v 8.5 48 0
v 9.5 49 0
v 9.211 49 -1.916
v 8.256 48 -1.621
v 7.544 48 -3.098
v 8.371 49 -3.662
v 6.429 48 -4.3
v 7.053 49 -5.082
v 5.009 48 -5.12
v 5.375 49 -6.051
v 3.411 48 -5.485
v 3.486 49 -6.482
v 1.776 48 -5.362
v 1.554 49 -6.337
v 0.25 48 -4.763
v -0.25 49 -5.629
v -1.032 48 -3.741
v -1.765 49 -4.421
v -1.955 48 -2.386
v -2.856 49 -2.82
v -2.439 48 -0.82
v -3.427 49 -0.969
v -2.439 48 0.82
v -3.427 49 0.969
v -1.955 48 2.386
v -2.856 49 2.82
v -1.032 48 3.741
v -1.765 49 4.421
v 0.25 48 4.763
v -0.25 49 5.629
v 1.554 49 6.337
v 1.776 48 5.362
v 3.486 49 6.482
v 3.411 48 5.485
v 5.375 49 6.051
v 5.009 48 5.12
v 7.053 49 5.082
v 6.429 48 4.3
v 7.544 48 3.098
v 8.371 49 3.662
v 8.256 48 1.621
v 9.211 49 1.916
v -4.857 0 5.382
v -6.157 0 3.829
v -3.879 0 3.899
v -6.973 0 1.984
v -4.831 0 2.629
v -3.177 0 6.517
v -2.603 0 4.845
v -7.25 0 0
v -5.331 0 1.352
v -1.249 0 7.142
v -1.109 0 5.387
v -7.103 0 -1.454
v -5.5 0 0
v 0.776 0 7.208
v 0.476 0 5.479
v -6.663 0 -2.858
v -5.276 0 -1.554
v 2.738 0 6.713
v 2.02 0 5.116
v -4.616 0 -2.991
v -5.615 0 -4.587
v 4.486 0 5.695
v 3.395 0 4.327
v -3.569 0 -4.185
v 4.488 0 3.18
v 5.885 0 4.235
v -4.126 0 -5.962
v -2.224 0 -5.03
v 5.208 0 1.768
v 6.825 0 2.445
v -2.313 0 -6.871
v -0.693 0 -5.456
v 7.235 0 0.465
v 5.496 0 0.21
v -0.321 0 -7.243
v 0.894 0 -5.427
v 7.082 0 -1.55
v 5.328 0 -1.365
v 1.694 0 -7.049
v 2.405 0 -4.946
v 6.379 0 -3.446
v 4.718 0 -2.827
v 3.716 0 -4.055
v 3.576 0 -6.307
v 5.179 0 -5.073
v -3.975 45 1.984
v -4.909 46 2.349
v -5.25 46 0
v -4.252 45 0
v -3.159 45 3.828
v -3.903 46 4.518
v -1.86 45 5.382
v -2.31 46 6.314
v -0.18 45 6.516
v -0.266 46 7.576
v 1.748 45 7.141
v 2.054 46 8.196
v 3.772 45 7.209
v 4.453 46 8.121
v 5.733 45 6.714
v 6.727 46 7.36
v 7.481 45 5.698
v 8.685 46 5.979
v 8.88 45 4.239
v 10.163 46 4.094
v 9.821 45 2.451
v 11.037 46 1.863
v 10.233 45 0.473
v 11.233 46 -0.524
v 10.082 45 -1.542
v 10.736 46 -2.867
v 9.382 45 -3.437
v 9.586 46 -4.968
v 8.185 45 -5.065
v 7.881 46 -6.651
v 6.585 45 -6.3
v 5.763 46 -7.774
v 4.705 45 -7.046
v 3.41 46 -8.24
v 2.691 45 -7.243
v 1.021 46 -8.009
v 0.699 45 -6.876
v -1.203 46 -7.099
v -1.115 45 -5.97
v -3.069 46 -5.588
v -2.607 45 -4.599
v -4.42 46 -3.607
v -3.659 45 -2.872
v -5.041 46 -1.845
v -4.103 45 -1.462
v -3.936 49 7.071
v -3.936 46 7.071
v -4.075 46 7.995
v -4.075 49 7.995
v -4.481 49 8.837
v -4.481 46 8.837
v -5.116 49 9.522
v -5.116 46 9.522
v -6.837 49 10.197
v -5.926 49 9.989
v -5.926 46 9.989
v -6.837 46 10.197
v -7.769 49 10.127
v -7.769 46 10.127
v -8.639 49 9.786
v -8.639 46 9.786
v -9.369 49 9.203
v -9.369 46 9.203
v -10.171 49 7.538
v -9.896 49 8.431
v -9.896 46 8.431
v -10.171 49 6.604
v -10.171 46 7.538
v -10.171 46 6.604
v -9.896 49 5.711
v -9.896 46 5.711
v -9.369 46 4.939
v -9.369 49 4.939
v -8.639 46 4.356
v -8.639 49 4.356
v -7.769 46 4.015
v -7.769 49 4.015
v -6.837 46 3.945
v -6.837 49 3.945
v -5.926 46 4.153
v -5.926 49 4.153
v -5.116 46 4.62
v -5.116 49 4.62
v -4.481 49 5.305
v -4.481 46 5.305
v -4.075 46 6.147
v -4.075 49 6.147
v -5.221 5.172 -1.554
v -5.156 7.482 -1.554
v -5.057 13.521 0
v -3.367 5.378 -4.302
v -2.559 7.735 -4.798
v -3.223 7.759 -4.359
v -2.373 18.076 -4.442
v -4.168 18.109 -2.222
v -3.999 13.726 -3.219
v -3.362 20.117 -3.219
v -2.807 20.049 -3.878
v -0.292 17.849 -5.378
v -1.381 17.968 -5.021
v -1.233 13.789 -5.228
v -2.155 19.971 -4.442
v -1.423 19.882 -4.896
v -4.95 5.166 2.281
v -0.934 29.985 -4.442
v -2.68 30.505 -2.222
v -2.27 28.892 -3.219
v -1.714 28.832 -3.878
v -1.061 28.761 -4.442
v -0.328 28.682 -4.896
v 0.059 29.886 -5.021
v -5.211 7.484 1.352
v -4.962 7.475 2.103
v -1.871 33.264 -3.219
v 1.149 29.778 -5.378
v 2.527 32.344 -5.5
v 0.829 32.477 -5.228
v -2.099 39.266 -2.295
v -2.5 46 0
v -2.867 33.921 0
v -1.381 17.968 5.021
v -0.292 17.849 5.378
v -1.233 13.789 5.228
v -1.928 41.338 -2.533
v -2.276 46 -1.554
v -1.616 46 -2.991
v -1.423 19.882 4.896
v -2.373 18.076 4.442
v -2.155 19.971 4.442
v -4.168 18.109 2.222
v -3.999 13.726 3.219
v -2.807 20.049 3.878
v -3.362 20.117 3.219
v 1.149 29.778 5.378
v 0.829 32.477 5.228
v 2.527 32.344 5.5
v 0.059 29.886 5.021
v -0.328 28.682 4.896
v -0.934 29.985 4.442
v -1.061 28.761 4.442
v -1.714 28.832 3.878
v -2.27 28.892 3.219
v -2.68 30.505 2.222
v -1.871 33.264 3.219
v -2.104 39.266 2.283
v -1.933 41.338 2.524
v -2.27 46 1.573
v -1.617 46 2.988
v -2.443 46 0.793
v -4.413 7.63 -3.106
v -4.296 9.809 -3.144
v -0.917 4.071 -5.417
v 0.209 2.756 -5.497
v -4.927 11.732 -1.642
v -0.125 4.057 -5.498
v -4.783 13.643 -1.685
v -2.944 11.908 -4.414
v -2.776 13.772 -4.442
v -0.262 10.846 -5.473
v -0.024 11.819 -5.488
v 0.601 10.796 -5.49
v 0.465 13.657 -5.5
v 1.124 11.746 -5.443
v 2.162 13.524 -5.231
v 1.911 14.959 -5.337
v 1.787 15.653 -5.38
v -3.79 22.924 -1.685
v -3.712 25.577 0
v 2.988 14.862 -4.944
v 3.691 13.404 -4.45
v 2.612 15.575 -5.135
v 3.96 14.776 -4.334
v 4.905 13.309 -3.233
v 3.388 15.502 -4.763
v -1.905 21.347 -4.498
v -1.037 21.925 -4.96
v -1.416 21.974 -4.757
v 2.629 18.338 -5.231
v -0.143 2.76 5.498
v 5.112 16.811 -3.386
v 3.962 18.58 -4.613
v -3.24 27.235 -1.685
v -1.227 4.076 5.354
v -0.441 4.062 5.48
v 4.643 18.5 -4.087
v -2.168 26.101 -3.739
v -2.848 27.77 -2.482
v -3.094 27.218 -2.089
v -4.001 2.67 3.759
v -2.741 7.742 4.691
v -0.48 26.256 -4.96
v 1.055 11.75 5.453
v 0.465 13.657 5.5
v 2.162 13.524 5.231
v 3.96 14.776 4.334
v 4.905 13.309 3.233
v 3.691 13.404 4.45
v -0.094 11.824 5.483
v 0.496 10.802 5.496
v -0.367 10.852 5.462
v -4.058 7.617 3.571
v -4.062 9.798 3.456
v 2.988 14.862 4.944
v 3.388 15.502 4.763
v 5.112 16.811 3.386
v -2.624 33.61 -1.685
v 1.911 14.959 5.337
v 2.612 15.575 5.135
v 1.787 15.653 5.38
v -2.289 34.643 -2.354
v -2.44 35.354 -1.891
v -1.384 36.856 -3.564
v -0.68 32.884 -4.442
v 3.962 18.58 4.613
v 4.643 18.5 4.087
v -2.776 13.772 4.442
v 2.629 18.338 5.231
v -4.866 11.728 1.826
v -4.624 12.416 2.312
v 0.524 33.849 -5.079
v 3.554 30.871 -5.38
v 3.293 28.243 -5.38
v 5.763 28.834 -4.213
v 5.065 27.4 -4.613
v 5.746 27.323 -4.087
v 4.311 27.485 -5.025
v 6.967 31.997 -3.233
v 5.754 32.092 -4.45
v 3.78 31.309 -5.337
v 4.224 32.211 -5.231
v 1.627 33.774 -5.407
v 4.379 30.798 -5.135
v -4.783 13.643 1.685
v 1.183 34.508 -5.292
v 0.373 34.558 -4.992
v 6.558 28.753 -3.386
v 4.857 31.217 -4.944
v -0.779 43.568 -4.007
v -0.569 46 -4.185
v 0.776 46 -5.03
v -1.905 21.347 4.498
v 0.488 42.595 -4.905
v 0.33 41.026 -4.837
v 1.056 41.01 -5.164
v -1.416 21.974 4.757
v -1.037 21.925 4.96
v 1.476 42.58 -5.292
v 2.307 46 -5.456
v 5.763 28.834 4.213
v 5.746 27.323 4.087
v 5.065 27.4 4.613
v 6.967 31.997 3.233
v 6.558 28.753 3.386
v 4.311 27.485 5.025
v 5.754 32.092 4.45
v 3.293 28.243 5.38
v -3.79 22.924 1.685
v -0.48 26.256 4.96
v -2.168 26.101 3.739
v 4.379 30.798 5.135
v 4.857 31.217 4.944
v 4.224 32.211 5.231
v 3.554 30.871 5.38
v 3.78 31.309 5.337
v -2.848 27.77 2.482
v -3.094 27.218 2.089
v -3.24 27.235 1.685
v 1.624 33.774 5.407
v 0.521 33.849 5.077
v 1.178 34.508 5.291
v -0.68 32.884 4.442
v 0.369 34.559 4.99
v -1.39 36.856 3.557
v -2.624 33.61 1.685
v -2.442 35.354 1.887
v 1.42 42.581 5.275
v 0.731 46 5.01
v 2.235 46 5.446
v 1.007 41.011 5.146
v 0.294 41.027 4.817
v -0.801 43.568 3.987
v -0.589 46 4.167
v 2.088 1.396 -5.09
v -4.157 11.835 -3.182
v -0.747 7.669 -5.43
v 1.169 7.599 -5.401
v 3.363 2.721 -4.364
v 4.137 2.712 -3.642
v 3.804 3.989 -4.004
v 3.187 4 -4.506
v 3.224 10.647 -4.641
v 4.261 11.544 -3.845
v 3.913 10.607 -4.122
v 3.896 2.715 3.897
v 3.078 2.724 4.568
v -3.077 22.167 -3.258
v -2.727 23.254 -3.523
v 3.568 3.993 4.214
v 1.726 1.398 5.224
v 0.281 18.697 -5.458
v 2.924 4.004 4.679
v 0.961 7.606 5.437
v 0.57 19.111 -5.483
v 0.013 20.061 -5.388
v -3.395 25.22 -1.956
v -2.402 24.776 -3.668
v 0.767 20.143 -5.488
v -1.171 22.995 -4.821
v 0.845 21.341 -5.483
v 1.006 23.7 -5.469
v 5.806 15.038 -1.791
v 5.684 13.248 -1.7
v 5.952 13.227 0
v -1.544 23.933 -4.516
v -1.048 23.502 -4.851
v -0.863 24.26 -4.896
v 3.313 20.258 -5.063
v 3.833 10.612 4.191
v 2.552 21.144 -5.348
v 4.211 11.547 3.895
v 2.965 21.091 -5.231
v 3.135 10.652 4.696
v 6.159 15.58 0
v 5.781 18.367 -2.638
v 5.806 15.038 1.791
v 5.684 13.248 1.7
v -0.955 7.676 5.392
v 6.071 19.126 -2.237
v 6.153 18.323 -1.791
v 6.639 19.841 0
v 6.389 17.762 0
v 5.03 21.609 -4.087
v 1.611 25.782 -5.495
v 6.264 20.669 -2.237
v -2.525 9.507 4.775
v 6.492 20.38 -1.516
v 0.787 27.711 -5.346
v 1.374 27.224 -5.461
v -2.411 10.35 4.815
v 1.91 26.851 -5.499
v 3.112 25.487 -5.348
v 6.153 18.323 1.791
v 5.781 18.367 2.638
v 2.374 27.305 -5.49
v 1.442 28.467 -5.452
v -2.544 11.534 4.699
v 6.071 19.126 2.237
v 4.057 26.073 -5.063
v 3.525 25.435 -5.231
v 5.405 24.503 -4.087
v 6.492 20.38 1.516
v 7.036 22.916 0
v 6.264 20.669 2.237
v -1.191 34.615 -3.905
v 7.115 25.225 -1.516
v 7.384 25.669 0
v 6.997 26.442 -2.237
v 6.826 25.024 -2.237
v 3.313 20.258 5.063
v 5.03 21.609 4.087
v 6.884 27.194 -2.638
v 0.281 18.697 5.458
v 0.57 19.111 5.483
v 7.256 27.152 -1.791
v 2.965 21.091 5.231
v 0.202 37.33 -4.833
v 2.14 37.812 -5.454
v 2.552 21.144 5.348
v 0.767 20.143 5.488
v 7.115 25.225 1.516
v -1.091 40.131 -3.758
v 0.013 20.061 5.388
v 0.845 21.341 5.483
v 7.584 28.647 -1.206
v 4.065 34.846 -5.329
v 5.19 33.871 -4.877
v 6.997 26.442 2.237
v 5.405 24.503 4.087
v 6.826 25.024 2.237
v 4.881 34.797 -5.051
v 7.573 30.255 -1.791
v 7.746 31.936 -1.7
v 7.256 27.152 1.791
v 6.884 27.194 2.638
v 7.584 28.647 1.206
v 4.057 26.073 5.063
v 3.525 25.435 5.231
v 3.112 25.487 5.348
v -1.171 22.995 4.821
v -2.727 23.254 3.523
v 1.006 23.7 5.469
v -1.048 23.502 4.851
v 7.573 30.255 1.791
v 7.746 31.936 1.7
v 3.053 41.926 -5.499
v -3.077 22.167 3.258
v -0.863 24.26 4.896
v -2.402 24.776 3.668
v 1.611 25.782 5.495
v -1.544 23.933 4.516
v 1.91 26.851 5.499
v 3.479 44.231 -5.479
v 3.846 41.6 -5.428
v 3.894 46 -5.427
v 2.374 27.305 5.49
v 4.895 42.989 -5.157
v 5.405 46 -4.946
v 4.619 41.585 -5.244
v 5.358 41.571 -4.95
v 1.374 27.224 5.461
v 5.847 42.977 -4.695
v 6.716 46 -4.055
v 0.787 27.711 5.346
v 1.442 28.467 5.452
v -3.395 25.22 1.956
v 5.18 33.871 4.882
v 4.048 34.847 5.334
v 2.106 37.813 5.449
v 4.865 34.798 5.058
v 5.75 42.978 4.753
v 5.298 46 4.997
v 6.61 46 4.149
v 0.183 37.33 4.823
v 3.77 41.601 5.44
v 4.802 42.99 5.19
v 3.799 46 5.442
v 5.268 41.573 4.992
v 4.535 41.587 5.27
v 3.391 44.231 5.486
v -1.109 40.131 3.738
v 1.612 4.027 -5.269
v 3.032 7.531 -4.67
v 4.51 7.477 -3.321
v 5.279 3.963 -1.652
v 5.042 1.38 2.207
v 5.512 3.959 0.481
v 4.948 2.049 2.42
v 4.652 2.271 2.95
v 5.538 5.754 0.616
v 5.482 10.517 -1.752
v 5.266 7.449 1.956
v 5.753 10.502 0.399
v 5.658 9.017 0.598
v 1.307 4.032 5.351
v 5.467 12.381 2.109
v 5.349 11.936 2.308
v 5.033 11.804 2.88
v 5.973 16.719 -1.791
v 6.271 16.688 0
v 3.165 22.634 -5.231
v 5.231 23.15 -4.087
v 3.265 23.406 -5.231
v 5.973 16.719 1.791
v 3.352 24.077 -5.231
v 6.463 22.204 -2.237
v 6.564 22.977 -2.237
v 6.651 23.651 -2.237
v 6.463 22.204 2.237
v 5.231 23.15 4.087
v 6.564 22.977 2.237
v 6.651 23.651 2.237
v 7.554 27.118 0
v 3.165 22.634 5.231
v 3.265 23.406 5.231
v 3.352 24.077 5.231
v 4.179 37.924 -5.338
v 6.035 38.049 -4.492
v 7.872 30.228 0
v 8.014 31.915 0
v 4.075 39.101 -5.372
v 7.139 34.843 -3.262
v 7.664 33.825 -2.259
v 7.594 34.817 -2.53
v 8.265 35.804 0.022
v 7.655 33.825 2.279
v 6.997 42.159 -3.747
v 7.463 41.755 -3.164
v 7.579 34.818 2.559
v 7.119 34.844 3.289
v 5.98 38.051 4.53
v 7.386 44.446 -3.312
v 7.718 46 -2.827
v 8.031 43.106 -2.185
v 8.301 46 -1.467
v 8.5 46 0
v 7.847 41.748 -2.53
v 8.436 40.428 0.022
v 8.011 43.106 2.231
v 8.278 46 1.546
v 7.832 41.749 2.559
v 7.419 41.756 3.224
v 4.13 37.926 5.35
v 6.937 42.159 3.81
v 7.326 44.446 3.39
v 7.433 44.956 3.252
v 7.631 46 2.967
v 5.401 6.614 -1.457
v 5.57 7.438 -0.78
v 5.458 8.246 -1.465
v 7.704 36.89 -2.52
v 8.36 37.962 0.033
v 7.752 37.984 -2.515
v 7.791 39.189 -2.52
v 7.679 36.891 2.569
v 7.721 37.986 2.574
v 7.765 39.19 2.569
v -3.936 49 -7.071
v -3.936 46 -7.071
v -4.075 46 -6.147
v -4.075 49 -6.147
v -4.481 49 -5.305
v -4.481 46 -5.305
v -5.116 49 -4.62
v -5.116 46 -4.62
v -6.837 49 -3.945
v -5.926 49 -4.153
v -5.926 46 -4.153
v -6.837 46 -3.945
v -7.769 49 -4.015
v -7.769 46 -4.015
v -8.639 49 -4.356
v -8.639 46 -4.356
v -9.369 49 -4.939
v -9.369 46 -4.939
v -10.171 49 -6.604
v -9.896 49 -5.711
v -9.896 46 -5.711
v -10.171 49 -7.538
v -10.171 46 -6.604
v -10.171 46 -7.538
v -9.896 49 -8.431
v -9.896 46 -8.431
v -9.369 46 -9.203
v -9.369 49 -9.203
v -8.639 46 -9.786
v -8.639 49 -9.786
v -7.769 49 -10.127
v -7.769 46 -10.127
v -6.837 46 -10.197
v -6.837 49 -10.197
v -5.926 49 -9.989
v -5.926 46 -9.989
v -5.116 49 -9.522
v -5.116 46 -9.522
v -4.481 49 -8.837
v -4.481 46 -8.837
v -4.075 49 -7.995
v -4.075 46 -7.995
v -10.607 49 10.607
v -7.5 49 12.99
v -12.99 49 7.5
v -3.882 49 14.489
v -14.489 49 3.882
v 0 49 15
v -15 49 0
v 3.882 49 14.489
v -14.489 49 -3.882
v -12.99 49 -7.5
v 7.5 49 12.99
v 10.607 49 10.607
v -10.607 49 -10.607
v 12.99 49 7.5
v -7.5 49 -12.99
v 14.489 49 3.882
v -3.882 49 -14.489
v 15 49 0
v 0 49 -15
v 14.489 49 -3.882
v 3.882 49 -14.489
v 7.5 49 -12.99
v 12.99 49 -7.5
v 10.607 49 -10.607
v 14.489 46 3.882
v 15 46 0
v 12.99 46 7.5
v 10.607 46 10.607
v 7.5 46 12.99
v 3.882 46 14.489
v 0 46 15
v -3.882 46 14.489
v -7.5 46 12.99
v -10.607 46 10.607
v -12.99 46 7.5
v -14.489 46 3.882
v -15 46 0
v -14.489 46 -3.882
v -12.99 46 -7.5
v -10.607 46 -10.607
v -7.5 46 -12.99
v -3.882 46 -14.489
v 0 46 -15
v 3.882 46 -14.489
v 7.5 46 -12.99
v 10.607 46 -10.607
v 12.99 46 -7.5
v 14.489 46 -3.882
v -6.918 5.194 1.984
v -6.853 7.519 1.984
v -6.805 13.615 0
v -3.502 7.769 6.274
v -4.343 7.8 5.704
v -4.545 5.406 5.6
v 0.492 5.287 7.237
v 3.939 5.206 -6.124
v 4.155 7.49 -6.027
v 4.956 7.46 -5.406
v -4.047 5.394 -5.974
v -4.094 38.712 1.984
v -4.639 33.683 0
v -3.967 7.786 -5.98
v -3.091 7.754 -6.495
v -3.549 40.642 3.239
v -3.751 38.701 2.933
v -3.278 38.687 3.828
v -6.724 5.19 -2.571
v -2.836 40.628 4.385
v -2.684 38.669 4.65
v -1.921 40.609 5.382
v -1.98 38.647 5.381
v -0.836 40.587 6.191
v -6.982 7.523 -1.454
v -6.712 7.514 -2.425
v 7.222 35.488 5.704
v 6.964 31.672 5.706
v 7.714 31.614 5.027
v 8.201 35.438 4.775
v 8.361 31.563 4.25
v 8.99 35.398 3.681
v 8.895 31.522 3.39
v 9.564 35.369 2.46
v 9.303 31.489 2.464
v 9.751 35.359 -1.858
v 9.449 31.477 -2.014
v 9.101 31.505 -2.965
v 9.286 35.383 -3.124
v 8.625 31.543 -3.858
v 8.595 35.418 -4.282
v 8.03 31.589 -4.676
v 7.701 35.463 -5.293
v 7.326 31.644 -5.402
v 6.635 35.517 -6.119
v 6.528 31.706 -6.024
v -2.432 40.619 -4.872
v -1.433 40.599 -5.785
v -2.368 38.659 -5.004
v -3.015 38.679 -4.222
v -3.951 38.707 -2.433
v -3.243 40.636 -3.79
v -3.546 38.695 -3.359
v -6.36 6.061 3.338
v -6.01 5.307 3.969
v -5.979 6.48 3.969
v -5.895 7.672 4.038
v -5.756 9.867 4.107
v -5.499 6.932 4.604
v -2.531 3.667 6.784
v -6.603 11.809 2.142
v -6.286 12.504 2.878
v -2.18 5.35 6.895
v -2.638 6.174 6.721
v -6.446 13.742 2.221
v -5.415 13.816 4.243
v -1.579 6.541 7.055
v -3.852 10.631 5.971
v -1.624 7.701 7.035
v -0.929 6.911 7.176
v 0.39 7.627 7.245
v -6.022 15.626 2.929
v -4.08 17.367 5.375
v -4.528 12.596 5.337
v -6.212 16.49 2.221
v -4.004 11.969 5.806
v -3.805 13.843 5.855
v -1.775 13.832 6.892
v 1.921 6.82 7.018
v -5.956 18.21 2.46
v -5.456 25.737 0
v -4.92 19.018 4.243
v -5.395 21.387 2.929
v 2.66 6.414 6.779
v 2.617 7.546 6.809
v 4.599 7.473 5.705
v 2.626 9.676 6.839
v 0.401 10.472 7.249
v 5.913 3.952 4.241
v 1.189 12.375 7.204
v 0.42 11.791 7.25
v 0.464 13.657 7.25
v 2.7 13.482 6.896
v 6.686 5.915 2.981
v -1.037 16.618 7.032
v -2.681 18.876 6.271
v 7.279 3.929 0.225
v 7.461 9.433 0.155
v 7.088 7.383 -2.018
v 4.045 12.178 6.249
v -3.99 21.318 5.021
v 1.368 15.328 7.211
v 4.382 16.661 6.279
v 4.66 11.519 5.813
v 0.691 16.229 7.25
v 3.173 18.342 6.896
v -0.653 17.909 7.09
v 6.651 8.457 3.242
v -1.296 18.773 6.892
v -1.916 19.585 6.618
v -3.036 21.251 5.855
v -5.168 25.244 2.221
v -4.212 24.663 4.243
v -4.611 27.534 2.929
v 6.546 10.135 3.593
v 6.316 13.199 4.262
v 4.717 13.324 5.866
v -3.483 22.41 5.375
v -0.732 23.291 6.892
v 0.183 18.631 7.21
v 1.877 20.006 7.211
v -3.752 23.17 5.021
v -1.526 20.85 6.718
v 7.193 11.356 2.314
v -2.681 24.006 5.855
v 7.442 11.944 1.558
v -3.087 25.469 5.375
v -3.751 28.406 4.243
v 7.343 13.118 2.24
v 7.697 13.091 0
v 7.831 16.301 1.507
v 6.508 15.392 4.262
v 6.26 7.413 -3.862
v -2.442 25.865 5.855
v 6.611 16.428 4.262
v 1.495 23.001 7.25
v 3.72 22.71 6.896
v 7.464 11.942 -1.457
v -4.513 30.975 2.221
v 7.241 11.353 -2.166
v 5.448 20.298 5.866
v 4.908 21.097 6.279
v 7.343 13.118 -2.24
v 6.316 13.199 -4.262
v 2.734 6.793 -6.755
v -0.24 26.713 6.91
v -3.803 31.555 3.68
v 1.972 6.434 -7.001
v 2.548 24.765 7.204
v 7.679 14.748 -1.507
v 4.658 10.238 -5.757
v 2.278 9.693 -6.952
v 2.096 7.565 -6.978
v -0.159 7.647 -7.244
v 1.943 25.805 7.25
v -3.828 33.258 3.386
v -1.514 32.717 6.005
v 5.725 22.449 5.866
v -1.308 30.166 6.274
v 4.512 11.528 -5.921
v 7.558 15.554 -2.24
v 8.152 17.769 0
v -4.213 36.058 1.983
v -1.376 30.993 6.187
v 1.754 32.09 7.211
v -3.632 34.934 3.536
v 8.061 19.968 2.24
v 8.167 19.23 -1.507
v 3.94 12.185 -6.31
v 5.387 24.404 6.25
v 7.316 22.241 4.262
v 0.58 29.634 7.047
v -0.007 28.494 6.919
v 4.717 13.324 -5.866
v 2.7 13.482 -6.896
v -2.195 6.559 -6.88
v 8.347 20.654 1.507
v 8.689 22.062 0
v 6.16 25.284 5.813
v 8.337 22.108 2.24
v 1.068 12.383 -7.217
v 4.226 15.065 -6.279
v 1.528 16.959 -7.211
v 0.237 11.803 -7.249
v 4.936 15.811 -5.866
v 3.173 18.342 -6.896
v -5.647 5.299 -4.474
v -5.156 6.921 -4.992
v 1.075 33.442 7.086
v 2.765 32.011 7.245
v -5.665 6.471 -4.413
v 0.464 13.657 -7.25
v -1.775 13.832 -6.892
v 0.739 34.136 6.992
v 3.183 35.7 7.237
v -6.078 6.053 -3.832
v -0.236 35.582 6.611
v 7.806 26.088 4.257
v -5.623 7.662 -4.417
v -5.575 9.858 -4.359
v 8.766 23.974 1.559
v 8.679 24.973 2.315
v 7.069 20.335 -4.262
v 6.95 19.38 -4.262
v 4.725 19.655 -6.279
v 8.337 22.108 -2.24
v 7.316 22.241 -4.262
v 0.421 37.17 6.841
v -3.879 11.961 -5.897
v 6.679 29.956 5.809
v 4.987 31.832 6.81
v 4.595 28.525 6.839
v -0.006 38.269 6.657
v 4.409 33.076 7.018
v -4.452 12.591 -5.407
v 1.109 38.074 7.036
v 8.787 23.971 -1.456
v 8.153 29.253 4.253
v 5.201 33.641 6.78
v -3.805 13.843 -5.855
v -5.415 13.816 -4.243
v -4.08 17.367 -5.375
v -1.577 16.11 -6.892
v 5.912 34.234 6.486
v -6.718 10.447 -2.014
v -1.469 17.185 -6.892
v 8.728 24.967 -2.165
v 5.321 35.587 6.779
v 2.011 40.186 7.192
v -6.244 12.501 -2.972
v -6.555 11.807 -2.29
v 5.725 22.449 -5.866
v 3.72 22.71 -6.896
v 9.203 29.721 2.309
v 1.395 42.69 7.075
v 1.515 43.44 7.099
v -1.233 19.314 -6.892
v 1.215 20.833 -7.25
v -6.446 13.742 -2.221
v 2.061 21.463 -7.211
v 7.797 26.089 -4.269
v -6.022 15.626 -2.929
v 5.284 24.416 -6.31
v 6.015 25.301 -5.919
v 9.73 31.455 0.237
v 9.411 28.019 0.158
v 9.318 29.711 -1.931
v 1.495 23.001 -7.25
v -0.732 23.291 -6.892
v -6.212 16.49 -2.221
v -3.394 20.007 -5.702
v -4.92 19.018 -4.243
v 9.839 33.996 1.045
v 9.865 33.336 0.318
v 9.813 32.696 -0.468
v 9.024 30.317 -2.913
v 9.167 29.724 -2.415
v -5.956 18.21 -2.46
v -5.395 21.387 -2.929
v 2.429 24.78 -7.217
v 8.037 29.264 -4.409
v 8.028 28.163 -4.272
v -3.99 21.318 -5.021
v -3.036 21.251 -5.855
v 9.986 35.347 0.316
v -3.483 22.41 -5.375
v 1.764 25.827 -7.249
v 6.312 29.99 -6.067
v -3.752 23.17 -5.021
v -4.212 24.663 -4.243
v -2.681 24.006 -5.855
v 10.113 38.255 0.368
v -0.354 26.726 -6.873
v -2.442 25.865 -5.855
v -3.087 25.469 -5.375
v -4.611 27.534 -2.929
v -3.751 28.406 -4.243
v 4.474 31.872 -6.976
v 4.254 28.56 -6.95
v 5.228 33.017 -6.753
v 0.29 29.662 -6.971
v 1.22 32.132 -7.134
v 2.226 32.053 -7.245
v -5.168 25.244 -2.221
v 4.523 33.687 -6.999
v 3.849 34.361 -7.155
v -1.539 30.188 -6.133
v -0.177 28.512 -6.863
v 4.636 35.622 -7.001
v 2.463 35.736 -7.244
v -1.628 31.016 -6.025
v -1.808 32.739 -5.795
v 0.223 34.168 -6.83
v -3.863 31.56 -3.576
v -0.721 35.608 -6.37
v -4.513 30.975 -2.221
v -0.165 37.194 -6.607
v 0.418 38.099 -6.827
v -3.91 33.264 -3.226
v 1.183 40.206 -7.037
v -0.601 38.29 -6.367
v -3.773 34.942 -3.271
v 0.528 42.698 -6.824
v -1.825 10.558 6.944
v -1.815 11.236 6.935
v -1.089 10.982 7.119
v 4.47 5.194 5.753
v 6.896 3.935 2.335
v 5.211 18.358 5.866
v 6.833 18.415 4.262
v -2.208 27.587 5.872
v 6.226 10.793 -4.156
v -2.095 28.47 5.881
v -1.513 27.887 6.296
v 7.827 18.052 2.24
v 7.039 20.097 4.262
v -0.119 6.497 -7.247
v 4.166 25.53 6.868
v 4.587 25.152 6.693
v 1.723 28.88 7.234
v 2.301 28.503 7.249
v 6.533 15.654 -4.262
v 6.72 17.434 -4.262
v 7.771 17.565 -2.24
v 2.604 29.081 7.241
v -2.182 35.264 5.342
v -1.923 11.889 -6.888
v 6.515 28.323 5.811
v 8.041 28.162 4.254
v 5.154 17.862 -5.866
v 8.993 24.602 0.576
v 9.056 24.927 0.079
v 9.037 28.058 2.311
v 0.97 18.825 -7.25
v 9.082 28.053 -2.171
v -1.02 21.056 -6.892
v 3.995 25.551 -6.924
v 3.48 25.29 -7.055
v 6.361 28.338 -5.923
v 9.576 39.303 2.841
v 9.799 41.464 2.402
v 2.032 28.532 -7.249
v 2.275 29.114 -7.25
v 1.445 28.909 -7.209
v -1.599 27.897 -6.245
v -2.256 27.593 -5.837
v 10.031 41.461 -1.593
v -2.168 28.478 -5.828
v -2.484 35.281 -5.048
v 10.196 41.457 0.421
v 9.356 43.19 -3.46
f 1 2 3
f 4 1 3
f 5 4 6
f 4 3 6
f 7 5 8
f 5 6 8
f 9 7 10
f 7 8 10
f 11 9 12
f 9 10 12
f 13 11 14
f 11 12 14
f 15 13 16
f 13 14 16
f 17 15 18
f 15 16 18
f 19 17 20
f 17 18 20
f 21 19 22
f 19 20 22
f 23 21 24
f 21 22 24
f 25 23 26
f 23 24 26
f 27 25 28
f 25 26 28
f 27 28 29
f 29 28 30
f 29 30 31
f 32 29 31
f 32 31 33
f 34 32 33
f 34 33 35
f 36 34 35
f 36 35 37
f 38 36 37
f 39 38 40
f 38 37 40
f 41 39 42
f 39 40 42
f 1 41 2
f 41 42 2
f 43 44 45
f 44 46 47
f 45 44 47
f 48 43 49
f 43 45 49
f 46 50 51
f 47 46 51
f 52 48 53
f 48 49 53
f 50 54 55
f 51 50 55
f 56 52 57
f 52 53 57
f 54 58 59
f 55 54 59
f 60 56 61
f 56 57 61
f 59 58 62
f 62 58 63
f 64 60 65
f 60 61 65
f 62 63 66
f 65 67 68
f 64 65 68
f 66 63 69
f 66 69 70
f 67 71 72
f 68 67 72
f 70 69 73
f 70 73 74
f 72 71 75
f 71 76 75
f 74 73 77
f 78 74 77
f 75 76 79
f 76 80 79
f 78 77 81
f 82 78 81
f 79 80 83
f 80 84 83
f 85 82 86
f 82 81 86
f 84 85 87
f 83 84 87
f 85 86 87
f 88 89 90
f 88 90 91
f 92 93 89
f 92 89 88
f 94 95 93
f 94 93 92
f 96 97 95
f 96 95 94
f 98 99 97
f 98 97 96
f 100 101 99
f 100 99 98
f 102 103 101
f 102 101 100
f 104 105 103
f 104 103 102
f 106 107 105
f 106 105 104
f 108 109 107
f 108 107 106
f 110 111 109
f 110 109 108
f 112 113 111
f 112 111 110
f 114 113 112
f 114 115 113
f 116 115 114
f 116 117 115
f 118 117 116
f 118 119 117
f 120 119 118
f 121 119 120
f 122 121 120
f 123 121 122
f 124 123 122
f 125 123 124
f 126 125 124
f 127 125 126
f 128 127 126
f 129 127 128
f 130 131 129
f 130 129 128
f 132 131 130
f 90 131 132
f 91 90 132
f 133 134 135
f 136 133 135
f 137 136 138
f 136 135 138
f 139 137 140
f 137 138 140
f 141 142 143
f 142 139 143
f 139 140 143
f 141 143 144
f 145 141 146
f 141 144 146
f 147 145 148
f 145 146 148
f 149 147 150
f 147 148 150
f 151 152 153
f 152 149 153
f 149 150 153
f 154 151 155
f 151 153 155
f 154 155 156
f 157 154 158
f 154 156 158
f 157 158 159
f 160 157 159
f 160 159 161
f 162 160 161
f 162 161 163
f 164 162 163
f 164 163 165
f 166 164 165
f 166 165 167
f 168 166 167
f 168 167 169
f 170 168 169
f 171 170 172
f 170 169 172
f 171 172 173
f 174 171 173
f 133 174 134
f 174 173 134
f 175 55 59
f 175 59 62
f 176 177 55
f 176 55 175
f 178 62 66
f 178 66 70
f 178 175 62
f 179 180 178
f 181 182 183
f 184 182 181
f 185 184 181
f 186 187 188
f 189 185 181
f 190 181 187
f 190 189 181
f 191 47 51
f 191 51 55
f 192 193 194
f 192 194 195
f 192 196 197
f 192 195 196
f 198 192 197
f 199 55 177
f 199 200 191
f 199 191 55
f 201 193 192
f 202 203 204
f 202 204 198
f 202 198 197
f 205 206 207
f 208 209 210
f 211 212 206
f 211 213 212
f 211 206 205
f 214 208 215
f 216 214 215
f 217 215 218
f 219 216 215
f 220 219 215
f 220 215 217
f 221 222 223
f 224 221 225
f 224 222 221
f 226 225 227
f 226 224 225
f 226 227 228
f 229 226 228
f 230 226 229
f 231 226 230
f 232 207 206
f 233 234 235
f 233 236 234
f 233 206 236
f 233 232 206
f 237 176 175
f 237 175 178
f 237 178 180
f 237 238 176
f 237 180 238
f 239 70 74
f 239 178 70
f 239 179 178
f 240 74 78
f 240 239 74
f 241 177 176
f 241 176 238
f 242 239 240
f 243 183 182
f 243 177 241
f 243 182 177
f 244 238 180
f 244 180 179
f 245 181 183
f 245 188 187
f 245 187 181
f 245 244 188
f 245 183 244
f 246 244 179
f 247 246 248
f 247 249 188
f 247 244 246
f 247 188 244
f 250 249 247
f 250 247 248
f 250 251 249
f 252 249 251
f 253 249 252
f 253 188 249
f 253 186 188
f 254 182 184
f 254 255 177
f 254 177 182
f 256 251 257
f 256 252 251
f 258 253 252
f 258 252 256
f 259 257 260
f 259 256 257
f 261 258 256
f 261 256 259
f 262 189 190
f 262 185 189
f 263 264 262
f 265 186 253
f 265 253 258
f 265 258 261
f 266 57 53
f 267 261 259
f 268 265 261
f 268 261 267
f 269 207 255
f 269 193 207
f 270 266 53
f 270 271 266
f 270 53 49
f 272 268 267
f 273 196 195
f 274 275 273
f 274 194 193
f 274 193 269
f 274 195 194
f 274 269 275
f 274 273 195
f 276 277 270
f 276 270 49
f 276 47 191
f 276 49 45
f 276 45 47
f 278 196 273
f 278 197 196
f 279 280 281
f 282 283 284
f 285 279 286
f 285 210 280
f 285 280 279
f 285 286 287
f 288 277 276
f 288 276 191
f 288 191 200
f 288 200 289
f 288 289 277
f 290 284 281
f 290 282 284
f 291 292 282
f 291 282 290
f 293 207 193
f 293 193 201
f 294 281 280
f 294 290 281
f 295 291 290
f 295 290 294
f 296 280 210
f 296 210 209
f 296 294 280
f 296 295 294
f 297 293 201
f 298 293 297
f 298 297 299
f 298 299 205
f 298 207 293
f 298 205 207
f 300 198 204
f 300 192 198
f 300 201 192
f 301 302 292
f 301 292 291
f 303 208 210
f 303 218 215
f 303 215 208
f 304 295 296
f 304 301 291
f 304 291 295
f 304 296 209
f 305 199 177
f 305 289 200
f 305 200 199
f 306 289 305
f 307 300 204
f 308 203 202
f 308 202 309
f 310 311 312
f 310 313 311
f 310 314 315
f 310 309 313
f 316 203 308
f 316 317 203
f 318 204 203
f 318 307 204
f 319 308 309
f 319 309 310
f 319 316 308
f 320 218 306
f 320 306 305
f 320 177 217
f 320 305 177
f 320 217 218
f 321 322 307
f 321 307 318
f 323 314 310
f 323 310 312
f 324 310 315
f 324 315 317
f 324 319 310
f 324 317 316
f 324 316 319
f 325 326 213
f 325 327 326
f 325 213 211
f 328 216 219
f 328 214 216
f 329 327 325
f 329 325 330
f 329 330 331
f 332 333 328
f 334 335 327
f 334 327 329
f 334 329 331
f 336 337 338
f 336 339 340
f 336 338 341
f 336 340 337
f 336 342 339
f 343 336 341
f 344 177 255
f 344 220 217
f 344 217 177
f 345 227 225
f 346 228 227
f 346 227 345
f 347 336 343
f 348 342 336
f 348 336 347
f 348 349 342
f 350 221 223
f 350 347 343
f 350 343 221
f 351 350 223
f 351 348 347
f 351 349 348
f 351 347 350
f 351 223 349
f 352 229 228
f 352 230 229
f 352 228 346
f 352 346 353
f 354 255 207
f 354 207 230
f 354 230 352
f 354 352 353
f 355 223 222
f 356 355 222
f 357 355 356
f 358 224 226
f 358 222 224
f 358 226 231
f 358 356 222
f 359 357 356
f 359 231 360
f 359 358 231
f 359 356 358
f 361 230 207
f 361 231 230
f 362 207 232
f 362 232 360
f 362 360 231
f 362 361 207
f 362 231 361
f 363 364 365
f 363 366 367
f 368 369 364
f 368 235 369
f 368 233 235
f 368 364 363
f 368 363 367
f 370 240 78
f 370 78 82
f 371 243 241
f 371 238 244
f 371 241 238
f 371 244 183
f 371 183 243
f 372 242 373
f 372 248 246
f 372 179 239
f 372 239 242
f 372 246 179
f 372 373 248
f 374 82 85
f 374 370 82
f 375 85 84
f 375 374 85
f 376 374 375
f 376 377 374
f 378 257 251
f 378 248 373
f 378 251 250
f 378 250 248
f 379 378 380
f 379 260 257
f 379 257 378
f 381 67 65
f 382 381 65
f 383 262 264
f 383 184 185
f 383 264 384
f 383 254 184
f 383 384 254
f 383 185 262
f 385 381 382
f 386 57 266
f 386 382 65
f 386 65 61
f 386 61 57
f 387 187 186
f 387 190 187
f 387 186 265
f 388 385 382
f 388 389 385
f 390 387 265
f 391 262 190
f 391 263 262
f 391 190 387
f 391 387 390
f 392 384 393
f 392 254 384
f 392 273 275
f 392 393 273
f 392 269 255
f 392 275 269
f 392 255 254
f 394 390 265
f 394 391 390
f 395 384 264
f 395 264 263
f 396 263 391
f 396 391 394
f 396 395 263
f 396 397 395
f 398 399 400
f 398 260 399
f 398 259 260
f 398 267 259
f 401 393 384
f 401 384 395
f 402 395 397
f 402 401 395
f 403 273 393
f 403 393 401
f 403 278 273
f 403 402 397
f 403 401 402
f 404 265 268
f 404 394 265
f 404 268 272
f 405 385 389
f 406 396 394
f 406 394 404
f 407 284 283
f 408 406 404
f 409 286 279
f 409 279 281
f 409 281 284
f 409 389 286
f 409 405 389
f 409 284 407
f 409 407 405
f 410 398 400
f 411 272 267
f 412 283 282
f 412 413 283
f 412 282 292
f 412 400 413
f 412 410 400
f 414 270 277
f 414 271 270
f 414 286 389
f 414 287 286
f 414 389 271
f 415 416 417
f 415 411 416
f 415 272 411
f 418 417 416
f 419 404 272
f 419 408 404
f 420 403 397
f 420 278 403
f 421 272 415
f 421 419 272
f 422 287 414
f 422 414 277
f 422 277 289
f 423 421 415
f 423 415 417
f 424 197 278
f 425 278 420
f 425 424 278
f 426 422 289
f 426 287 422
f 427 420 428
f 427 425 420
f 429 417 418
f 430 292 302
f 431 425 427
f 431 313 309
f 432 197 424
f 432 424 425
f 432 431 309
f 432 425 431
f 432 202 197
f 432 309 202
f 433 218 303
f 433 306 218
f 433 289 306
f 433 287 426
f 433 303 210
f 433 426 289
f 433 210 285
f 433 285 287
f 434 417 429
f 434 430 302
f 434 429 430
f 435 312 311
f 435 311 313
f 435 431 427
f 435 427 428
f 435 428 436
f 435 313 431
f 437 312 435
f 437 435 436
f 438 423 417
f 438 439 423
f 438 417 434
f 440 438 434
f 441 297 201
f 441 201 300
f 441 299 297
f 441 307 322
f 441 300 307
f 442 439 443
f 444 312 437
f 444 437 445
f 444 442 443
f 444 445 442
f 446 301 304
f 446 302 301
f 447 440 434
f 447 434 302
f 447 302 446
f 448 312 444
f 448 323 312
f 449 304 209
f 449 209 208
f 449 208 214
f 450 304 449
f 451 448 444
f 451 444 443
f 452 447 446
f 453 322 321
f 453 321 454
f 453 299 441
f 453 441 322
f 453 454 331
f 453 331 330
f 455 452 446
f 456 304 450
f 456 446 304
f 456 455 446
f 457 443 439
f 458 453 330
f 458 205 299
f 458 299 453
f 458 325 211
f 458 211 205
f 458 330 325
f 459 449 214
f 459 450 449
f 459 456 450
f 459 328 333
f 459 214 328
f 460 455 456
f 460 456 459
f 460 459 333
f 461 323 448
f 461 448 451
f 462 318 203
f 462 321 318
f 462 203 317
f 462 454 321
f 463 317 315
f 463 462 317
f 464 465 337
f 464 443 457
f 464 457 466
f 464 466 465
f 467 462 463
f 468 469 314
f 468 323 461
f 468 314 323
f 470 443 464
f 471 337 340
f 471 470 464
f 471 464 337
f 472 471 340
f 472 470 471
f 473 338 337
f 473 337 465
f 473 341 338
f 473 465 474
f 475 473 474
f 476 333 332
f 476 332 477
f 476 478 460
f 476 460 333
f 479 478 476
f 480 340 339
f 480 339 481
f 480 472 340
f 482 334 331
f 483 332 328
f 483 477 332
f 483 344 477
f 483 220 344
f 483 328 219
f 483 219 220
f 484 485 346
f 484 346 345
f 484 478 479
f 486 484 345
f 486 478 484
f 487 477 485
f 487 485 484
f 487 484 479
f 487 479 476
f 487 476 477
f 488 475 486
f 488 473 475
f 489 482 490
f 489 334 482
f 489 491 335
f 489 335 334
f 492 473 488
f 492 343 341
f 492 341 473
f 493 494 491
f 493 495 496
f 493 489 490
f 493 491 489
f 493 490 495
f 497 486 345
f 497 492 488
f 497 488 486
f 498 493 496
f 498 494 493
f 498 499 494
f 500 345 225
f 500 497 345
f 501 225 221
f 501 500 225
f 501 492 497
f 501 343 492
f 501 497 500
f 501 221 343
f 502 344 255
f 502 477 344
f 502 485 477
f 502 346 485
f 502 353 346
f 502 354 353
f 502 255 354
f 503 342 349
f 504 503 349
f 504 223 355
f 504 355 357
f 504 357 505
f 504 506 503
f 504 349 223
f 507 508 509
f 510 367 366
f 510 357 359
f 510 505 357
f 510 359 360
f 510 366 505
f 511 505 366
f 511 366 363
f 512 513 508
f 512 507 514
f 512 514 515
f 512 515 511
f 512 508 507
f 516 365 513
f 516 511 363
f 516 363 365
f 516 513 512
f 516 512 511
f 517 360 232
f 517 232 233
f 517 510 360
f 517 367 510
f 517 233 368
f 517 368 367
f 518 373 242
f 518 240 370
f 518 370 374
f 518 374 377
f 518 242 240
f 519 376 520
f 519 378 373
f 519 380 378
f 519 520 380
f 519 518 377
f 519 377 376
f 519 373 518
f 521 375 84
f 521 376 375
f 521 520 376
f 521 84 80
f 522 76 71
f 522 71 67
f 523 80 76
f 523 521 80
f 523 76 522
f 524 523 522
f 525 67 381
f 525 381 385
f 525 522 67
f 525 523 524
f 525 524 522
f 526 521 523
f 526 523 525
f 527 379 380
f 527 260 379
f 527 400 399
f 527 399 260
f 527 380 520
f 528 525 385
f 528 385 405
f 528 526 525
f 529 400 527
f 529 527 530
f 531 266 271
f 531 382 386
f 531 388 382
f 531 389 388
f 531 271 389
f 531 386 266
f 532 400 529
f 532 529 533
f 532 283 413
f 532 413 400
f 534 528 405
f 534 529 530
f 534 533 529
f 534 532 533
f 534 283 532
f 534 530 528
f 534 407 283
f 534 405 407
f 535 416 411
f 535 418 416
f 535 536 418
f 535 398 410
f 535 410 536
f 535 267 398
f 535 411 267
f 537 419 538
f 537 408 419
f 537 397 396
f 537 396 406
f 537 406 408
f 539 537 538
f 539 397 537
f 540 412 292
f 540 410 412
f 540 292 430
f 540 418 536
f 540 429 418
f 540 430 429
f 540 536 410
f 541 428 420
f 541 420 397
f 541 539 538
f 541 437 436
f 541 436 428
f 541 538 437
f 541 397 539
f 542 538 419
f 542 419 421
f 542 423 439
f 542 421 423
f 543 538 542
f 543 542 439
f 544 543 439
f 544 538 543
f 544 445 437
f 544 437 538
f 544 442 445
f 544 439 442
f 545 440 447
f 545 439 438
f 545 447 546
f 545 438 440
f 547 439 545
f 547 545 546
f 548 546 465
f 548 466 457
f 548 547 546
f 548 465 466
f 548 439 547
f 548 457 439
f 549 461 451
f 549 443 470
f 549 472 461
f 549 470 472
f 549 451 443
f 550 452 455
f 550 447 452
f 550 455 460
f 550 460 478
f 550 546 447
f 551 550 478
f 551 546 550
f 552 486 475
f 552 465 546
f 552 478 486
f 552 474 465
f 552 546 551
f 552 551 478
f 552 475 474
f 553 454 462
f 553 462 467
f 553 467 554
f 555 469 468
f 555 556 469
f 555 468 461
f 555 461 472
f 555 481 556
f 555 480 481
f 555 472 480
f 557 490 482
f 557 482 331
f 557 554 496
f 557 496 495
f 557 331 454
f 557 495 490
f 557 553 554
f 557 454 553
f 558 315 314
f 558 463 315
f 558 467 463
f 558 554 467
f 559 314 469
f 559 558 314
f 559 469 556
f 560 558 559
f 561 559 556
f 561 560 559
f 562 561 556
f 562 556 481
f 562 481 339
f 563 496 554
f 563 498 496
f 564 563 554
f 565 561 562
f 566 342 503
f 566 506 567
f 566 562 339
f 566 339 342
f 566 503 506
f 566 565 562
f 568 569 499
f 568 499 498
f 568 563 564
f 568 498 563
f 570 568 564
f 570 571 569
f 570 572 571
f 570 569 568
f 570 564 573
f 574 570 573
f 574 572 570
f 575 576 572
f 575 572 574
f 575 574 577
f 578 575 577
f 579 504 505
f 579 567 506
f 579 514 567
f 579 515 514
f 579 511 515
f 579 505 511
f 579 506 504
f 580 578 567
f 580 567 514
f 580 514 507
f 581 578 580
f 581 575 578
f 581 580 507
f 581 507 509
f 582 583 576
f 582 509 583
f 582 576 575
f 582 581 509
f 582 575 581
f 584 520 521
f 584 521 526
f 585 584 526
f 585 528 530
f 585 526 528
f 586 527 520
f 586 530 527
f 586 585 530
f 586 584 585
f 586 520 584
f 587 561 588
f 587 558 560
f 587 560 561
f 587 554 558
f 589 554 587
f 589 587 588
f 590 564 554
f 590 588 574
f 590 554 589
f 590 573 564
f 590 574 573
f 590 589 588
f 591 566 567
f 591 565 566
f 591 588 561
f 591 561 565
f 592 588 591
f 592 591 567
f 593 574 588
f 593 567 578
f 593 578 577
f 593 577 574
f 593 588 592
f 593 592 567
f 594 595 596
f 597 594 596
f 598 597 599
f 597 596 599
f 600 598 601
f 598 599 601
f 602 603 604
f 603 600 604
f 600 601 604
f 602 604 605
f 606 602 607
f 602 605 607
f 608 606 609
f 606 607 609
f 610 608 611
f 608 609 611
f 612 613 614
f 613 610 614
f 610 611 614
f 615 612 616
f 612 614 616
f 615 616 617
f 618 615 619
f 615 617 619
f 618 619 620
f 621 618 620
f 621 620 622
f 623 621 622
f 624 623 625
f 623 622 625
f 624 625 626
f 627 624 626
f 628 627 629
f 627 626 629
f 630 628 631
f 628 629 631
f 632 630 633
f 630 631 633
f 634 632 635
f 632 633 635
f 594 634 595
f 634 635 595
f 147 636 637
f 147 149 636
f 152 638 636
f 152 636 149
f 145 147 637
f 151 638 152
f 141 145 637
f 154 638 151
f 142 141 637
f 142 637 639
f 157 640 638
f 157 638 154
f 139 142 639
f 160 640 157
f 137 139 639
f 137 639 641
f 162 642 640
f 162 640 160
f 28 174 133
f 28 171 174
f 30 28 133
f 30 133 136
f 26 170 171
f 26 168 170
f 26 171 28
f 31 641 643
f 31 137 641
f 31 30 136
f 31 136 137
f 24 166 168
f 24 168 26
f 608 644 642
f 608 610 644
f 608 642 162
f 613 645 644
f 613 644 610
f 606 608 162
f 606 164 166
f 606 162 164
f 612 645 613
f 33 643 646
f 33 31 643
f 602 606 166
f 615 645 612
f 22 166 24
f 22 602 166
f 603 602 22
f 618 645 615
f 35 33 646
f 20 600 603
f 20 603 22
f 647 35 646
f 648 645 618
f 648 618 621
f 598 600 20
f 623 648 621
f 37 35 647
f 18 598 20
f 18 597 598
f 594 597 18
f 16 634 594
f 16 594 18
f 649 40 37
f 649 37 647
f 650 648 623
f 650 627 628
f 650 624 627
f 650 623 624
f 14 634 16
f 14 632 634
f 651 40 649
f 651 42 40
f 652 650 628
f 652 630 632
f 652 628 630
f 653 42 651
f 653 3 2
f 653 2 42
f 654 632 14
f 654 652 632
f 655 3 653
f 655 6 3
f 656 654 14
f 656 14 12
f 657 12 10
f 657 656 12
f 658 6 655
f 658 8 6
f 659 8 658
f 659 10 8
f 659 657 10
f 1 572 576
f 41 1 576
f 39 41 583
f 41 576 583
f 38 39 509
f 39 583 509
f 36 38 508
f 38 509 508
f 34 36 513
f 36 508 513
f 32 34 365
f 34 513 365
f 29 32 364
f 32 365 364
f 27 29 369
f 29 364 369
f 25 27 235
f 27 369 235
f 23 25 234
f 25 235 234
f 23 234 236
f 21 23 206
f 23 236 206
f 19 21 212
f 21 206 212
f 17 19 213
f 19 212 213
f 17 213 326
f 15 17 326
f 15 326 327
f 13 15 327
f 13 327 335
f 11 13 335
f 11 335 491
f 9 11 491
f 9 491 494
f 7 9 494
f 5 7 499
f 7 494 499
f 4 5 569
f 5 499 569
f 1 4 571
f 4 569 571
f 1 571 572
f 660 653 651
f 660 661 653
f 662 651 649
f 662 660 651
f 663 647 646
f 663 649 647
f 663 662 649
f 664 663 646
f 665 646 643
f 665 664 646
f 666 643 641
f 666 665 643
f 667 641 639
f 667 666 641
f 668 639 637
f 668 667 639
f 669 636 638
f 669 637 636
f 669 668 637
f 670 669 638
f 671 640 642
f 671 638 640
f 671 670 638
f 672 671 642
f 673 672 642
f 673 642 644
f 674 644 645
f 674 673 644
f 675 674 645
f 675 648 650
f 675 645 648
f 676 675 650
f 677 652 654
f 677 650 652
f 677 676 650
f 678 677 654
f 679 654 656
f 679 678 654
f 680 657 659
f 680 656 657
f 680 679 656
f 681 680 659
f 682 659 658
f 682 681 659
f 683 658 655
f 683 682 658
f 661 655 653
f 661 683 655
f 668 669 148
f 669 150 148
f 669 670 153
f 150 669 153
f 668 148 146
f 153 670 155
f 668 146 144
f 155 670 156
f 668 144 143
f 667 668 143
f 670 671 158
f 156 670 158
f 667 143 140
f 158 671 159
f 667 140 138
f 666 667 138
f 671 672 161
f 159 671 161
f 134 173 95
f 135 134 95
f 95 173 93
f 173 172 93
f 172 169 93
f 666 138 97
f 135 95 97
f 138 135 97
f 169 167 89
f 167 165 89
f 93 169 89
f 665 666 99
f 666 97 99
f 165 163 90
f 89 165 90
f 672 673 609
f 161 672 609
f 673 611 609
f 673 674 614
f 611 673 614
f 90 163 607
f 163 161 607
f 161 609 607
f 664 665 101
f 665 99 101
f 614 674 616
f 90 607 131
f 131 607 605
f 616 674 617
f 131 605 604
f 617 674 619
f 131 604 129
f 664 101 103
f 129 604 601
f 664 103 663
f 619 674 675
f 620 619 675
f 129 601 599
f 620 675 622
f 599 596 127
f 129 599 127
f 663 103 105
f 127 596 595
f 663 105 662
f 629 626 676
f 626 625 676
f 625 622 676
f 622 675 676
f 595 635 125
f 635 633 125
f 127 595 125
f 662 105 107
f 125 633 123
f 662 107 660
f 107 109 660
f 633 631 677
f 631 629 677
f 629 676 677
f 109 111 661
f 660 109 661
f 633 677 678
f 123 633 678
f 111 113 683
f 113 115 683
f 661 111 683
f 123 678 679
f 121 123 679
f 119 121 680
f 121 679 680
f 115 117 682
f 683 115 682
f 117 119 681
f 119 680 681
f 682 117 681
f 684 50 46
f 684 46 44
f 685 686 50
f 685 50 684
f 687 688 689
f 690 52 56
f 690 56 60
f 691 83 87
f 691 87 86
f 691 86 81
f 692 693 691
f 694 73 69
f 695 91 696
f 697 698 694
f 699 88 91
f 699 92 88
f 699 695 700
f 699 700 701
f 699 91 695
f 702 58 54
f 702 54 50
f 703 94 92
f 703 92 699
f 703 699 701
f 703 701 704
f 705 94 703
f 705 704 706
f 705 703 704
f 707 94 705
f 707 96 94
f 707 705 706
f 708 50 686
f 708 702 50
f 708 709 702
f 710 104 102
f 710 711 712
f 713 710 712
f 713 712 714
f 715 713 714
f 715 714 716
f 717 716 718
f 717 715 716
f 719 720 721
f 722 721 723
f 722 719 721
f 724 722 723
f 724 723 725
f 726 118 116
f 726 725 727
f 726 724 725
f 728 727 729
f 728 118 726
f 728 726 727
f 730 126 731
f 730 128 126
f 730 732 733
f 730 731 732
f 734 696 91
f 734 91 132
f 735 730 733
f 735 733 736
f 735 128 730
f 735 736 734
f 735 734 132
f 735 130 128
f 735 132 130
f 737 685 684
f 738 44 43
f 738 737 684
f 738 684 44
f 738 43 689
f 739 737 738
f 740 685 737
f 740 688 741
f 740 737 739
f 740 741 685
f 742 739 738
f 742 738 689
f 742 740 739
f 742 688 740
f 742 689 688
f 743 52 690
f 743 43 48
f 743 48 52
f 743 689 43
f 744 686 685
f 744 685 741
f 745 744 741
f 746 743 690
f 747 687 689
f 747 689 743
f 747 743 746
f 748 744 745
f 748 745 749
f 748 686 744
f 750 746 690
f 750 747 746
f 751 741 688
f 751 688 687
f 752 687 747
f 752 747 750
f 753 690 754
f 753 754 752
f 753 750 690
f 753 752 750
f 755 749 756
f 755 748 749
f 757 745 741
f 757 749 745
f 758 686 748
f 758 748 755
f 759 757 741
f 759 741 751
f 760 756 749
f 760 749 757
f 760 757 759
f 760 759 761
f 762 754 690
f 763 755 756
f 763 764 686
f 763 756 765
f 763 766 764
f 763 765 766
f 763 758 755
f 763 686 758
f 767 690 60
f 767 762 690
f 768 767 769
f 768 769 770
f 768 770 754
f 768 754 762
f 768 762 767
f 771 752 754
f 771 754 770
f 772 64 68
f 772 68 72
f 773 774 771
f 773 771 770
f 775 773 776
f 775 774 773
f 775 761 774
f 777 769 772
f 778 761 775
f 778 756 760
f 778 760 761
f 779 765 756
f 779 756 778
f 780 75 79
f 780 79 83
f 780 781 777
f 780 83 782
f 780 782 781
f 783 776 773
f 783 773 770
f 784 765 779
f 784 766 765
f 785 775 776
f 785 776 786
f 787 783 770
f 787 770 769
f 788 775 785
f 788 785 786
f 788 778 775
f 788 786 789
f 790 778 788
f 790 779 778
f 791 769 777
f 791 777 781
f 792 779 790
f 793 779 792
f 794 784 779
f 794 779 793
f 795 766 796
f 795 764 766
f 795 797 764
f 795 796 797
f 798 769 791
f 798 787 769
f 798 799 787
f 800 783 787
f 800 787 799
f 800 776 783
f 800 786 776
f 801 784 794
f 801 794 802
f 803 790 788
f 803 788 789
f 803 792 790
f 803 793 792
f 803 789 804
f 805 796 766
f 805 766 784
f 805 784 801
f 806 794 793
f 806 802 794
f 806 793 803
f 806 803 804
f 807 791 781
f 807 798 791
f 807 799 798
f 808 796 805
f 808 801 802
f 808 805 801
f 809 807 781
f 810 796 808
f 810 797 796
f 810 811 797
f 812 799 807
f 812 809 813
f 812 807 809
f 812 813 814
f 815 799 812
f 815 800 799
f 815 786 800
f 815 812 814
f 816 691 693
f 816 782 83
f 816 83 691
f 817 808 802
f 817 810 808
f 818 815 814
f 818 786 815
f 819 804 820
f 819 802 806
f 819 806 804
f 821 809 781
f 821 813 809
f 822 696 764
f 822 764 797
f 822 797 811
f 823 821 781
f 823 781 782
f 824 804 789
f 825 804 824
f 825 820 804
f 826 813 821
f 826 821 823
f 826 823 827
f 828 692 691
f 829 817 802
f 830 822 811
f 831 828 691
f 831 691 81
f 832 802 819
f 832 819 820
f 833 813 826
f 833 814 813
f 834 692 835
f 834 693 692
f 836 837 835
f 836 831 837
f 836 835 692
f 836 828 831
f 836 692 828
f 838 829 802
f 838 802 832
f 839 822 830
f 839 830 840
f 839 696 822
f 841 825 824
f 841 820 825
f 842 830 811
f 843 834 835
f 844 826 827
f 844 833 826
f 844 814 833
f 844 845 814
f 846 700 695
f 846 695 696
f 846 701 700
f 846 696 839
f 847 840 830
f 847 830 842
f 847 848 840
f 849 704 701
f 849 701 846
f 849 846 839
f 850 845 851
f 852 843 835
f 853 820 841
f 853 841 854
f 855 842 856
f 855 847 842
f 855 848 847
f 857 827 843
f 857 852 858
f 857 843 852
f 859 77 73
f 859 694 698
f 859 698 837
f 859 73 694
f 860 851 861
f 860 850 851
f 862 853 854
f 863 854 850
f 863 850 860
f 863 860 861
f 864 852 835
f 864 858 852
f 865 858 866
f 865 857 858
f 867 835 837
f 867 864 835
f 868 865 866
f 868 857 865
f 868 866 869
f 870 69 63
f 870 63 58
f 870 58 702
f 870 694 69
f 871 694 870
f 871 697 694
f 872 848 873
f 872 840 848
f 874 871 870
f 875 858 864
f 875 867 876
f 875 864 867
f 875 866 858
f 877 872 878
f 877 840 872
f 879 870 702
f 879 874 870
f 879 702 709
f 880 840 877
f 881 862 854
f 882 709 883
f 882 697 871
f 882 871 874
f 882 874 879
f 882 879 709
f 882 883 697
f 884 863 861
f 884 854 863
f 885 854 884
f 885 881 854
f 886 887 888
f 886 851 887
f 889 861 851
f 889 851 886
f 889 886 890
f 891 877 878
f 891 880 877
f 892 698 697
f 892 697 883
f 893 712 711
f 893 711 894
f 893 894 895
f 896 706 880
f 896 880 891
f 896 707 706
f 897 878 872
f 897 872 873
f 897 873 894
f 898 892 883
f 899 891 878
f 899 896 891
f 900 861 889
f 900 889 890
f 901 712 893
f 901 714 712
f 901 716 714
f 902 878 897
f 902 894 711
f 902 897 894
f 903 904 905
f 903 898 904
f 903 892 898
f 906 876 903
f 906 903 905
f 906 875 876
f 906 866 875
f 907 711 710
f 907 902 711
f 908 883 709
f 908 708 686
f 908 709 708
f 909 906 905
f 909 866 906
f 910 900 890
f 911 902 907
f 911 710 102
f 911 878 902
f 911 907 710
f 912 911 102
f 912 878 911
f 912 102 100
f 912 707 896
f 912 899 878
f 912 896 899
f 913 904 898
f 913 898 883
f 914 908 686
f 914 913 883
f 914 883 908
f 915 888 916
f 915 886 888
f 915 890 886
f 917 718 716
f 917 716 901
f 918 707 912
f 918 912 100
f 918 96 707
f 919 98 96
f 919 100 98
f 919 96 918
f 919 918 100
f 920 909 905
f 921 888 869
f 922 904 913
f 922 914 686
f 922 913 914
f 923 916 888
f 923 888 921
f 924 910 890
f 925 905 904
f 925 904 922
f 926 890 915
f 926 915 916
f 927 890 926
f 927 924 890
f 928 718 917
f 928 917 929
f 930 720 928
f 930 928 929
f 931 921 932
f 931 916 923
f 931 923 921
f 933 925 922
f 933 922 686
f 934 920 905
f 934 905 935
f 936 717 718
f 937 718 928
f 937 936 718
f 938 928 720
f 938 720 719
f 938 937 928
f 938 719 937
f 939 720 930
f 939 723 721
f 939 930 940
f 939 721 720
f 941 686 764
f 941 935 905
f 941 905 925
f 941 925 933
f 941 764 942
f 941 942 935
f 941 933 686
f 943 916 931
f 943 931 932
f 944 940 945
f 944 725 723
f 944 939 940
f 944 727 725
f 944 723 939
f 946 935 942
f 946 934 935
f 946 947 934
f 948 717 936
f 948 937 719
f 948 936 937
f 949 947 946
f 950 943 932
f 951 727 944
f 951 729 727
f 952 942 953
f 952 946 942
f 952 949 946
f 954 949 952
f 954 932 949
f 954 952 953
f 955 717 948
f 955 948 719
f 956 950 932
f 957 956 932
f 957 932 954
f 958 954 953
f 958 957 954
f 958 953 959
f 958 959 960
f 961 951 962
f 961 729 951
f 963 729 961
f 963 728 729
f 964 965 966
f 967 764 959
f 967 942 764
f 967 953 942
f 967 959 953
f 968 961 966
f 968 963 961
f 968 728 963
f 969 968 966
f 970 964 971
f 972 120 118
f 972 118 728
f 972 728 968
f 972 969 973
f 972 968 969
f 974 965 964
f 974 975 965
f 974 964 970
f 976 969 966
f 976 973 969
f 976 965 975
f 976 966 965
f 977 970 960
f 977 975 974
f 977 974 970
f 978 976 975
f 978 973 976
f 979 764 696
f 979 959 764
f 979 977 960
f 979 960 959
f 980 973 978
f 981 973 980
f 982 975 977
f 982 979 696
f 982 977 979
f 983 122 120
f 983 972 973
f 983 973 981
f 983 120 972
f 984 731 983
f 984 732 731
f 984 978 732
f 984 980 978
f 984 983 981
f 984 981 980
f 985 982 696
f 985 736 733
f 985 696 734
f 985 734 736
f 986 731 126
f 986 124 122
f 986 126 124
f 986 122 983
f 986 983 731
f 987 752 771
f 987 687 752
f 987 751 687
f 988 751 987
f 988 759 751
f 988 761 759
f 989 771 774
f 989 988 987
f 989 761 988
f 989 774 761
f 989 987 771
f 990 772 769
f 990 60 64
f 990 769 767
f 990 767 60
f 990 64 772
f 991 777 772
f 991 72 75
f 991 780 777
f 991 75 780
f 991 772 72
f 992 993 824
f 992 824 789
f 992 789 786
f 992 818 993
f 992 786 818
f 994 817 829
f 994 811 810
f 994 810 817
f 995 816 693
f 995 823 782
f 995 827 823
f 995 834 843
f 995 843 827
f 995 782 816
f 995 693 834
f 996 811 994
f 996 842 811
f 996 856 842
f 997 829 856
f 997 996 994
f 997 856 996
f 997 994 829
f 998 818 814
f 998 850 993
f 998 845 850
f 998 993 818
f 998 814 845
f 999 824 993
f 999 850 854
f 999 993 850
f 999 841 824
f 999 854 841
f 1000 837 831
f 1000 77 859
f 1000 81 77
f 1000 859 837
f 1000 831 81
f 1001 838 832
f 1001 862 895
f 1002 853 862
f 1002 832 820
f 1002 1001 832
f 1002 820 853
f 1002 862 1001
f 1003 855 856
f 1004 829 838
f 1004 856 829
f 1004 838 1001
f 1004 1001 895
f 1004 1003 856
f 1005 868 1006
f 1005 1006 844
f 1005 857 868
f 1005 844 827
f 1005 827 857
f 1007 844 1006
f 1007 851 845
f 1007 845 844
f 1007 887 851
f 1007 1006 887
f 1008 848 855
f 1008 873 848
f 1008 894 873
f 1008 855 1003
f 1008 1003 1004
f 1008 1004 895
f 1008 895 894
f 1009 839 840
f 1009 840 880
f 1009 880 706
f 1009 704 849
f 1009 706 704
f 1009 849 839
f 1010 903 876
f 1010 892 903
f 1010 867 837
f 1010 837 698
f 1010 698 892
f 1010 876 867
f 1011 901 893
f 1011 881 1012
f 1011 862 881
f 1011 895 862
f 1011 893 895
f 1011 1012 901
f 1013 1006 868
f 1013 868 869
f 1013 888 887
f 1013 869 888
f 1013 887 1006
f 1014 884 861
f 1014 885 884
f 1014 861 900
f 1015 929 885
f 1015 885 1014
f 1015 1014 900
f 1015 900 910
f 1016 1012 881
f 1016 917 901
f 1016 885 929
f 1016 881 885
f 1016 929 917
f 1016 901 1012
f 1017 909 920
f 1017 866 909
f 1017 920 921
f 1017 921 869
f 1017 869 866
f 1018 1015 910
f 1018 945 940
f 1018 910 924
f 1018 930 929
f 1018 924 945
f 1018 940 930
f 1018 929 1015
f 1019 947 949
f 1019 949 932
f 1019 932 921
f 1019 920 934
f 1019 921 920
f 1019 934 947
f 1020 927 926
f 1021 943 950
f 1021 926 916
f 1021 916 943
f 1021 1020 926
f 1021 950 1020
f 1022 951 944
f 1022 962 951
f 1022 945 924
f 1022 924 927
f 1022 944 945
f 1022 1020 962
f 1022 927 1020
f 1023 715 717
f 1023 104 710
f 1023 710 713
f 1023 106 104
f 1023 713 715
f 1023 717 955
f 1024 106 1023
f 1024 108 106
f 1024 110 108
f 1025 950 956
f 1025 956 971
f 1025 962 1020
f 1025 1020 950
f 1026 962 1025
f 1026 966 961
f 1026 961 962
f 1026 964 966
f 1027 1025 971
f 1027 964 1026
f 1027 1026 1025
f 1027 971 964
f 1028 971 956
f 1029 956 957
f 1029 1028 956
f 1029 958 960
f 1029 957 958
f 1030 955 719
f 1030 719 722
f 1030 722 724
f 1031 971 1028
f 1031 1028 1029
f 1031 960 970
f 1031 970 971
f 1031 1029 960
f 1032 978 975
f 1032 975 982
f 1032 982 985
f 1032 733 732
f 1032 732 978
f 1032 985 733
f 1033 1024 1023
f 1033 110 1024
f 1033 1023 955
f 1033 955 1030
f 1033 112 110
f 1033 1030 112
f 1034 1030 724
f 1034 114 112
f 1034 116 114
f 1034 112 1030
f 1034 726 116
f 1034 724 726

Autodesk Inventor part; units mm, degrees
ref_plane "YZ Plane" through (0, 0, 0) normal (1, 0, 0) x (0, 1, 0)
ref_plane "XZ Plane" through (0, 0, 0) normal (0, 1, 0) x (-1, 0, 0)
ref_plane "XY Plane" through (0, 0, 0) normal (0, 0, 1) x (1, 0, 0)
sketch "Sketch1" plane through (0, 0, 0) normal (0, 1, 0) x (-1, 0, 0)
  circle A0 centre (0, 0) radius 7.25
  circle A1 centre (0, 0) radius 5.5
  dimension "d0" = 14.5
  dimension "d7" = 11
sketch "Sketch2" plane through (0, 0, 0) normal (0, 0, 1) x (1, 0, 0)
  line L0 (0, 0) -> (0, 23) construction
  line L1 (0, 23) -> (3, 23) construction
  line L2 (3, 23) -> (3, 46) construction
  spline S0 degree 3 poles (0, 0) (0, 23) (3, 23) (3, 46) knots 1 1 1 1 2 2 2 2
  line L3 (0, 46) -> (0, 0) construction
  line L4 (0, 46) -> (3, 46) construction
  dimension "d1" = 46
  dimension "d3" = 3
sweep "Sweep1" add profiles "Sketch1" path "Sketch2"
sketch "Sketch3" plane through (3, 46, 0) normal (0, 1, 0) x (1, 0, 0)
  circle A0 centre (-3, 0) radius 15
  circle A1 centre (-10.0711, 7.0711) radius 3.135
  circle A2 centre (-10.0711, -7.0711) radius 3.135
  circle A3 centre (-3, 0) radius 7.25 construction
  line L0 (-10.0711, 7.0711) -> (-3, 0) construction
  line L1 (-3, 0) -> (-18, 0) construction
  line L2 (-3, 0) -> (-10.0711, -7.0711) construction
  circle A4 centre (0, 0) radius 5.5 projected
  point P0 (-10.25, 0)
  point P1 (-5.5, 0)
  dimension "d8" = 30
  dimension "d9" = 6.27
  dimension "d10" = 45
  dimension "d11" = 45
  dimension "d12" = 10
extrude "Extrusion1" add sketch "Sketch3" along normal blind 3
chamfer "Chamfer1" distance 1 angle 45 1 edges at (10.25, 46, 0)
chamfer "Chamfer2" distance 1 angle 45 1 edges at (-2.5, 49, 0)
properties part number "Nipple-3dprinted-metal" material "Stainless Steel"
